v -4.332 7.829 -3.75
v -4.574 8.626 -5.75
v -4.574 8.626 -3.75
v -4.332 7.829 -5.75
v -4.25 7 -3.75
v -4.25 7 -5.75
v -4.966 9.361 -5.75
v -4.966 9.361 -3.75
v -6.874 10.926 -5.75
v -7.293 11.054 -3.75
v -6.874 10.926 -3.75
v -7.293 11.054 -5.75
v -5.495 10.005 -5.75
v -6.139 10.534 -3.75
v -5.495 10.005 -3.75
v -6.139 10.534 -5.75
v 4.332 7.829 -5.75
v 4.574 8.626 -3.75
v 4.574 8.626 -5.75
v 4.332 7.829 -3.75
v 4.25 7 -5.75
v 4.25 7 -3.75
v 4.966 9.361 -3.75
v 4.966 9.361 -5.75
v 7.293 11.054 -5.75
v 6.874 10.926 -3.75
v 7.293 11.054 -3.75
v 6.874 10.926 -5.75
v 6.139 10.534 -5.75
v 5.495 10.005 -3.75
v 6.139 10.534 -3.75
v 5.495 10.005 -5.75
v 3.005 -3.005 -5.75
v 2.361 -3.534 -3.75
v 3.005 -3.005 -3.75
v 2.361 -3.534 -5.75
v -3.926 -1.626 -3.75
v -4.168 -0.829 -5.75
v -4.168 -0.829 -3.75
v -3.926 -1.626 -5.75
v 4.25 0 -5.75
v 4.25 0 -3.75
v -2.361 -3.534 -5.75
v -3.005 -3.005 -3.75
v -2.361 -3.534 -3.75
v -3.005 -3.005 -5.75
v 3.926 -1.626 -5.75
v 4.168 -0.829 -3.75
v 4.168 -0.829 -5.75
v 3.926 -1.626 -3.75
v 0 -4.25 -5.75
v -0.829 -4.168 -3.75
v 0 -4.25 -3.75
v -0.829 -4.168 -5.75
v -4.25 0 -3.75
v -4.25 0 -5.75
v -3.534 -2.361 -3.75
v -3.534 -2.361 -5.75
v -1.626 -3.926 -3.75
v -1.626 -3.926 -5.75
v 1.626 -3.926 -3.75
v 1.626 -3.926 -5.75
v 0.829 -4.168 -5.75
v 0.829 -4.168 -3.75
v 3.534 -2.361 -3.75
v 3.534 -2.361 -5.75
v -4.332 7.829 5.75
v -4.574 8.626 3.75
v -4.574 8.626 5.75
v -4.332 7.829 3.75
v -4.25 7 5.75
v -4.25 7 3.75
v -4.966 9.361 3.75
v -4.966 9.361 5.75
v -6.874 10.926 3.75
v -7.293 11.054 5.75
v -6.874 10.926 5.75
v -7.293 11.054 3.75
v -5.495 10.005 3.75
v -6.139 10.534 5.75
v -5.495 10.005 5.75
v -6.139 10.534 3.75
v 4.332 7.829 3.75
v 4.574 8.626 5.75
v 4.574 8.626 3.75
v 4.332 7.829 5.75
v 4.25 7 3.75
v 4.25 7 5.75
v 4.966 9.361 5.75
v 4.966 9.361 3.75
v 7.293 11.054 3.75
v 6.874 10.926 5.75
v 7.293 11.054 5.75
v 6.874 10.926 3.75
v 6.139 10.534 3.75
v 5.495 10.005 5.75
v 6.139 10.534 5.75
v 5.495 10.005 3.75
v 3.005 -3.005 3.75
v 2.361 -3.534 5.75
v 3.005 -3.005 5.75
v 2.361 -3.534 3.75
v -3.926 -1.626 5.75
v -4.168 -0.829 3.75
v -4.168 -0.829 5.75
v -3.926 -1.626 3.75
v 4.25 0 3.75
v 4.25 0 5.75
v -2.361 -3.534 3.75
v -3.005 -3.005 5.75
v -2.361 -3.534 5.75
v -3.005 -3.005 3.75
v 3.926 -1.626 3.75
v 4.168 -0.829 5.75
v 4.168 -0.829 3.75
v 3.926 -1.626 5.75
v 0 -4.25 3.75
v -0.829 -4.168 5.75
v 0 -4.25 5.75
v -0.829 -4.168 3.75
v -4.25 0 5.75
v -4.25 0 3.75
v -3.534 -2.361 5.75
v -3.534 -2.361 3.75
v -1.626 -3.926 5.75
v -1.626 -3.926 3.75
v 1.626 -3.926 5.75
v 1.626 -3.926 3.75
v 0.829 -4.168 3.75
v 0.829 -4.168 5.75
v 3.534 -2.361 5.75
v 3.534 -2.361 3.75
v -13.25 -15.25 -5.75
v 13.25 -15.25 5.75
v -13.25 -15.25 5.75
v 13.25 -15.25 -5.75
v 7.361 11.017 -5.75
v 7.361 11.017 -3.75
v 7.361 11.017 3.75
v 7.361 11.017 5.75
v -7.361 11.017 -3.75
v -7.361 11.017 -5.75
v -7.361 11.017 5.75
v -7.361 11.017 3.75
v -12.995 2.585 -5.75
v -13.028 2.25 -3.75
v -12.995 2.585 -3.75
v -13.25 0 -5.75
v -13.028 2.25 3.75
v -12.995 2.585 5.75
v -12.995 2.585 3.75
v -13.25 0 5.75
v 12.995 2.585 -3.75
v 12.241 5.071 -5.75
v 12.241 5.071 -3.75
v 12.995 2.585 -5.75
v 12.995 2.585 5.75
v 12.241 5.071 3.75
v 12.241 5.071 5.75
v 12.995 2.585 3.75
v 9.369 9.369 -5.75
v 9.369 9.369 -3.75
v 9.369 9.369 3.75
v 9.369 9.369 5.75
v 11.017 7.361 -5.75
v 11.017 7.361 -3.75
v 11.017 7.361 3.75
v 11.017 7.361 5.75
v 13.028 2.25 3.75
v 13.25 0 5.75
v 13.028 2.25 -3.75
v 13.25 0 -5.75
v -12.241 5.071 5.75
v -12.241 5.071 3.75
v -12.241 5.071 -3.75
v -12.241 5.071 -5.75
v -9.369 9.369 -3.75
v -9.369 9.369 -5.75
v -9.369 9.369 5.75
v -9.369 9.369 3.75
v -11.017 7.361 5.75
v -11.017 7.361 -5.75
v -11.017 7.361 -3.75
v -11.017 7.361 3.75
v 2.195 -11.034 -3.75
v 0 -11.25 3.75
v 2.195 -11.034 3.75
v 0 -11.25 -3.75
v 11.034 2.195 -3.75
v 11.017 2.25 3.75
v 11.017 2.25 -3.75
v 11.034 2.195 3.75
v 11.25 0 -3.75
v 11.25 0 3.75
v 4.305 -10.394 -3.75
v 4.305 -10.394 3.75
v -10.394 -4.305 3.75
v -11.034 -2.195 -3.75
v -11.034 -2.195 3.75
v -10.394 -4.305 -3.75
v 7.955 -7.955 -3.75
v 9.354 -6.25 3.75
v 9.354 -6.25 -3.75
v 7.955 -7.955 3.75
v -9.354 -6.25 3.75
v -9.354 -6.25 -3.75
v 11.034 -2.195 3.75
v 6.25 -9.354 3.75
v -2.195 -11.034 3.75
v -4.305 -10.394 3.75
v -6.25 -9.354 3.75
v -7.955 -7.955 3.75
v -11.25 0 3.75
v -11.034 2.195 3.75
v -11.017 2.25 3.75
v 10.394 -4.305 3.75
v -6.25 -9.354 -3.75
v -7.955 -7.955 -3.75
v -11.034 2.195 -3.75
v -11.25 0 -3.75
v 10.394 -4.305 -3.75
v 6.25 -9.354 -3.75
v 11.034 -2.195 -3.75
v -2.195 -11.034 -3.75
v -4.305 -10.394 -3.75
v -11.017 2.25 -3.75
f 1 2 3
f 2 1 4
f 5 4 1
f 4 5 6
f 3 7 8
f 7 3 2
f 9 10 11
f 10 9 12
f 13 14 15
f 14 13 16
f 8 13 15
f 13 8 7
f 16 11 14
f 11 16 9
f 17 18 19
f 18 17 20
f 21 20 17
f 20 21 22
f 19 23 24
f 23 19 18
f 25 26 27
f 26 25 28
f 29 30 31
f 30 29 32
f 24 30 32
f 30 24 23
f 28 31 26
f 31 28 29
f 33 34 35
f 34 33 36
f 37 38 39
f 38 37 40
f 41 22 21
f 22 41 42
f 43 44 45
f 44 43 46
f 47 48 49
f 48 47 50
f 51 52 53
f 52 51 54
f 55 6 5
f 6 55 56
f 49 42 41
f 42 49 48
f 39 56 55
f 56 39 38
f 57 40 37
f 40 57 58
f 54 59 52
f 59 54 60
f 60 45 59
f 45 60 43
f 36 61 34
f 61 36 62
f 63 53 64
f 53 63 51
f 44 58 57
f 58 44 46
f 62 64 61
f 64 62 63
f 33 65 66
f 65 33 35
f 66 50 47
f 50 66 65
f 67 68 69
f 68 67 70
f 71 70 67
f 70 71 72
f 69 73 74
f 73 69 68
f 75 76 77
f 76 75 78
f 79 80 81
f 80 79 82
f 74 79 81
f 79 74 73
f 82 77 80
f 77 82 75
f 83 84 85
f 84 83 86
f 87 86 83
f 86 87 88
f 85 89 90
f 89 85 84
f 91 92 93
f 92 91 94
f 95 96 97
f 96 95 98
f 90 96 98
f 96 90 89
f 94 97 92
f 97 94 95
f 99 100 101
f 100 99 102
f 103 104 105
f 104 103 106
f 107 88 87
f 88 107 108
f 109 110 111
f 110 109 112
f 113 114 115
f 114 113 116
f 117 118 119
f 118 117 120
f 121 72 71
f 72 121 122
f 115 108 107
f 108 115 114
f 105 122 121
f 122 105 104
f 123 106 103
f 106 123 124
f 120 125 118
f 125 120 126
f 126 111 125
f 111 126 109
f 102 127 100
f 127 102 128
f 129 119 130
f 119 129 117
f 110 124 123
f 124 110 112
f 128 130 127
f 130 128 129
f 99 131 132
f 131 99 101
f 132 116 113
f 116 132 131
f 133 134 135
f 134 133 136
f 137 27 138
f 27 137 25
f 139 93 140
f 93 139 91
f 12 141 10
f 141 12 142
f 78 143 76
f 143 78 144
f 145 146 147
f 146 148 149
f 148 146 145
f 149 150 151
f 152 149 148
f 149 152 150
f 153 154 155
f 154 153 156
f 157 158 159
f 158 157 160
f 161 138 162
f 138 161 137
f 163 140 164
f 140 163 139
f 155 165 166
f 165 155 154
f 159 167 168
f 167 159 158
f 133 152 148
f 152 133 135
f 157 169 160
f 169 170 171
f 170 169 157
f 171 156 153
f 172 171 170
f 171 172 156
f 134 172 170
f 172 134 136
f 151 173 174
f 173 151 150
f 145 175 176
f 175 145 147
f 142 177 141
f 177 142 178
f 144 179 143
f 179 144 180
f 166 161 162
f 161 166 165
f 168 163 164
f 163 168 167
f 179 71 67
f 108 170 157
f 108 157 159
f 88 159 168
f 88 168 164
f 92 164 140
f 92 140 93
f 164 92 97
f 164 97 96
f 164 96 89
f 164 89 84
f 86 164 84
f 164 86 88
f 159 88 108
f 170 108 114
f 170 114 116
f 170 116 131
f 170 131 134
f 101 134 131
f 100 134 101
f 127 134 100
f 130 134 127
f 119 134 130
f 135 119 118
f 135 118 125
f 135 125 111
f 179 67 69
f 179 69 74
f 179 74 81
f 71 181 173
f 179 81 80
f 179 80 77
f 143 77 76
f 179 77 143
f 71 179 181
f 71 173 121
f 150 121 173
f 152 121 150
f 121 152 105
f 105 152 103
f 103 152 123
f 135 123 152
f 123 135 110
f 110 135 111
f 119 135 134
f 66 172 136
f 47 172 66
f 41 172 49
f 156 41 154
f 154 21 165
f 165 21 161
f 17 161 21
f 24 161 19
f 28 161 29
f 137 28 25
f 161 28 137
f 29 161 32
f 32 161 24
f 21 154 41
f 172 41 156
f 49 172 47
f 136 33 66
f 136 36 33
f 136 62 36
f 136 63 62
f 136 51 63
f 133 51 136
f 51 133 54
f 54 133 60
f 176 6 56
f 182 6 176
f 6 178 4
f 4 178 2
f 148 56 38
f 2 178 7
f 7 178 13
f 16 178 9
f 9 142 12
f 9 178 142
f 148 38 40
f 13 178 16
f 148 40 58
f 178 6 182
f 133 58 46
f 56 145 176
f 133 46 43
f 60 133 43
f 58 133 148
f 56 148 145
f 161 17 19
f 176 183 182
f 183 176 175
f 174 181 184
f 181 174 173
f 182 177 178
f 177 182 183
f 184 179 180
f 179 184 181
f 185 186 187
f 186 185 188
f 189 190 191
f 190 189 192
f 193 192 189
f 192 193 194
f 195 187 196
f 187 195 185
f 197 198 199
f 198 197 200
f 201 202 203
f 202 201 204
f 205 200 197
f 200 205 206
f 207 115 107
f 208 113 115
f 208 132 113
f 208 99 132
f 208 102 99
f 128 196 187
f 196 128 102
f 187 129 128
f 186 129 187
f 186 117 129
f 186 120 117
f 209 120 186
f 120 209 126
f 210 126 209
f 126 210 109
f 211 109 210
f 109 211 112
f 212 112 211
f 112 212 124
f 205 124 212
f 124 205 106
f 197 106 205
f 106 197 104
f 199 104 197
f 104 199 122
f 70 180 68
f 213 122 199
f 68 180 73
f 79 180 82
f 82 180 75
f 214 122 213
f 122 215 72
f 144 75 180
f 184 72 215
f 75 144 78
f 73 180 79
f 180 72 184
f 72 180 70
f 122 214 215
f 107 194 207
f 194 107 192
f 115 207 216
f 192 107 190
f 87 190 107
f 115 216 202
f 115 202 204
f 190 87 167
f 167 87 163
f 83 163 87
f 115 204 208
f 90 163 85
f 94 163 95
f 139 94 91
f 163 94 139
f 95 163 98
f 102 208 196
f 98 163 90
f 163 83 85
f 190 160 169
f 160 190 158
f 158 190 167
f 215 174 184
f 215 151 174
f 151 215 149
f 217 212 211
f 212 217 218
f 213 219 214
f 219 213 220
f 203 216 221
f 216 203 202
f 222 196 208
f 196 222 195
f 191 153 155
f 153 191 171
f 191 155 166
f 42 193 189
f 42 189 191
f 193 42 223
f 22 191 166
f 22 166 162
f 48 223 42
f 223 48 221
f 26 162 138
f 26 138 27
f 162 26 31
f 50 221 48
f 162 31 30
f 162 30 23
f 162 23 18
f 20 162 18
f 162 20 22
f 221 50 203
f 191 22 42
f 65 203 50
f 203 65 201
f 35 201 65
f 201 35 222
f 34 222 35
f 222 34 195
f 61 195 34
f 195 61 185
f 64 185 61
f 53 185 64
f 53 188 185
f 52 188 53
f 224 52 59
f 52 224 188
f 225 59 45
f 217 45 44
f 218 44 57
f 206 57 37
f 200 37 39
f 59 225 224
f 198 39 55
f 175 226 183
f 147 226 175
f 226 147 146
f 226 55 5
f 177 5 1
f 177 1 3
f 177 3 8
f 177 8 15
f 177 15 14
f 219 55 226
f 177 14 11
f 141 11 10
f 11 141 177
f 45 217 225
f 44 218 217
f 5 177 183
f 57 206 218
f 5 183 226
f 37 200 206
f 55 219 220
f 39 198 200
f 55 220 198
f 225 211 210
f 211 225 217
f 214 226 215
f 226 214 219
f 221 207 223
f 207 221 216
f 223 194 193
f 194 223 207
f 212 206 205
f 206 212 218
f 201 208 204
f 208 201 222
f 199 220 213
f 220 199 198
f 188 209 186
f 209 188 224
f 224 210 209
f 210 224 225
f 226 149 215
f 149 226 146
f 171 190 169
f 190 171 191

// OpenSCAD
$fn = 32;

cutting_epsilon = 0.01;

module cutout_rounding_cutter(rounding = 5, height = 10) {
	difference() {
		// take a cylinder out of a cube to get a cutter that can cut
		// bevels
		cube([rounding, rounding, height], center = true);
		translate([-rounding/2, -rounding/2, 0])
			cylinder(d = rounding, h = height + 2*cutting_epsilon, center = true);
	}
}

module shaft_cutout_cutter(width, diameter, slot_height = 0,
		rounding = 0, rounding_height = 0) {
	// cutout for shaft
	hull() {
		cylinder(h = width, d = diameter, center = true);
		if (slot_height > 0) {
			translate([0, slot_height, 0])
				cube([diameter, 1, width], center = true);
		}
	}

	// round the cutout for the shaft
	if (slot_height > 0 && rounding > 0) {
		rounding_height = rounding_height == -1 ? slot_height : rounding_height;
		translate([0, rounding_height, 0]) {
			translate([-rounding/2, 0, 0])
				cutout_rounding_cutter(rounding, width);
			translate([rounding/2, 0, 0])
				mirror([1, 0, 0])
					cutout_rounding_cutter(rounding, width);
		}
	}
}

module bearing_holder(outer_diameter = 22, width = 7, thickness = 2,
		clip_cutting_factor = 0.1, shaft_diameter = 8,
		bottom_shaft_hole = true, top_shaft_hole = true,
		bottom_shaft_slot = true, top_shaft_slot = true,
		shaft_slots_rounded = true,
		epsilon = 0.25) {
	cw = width + 2*epsilon;
	cod = outer_diameter + 2*epsilon;
	csd = shaft_diameter + 2*epsilon;

	diameter_overall = cod + 2*thickness;
	width_overall = cw + 2*thickness;
	clip_cutting_pos = cod * clip_cutting_factor;
	difference() {
		// flow holder and socket into each other
		hull() {
			// outer casing for holding the bearing
			cylinder(h = width_overall, d = diameter_overall, center = true);

			// socket that is one thickness thick and overall
			// diameter and it's own thickness below the holder
			translate([0, -diameter_overall/2 - thickness/2, 0])
				cube([diameter_overall, thickness, width_overall], center = true);
		}

		// cutout the size of the actual bearing
		#cylinder(h = cw, d = cod, center = true);

		// cutout so that bearing can be clipped into holder
		clip_cutter_height = diameter_overall / 2;
		translate([0, clip_cutter_height / 2 + clip_cutting_pos, 0])
			cube([diameter_overall, clip_cutter_height, cw],
				center = true);

		shaft_slot_height = diameter_overall/2;
		shaft_slot_rounding = shaft_slots_rounded ? csd : 0;
		shaft_slot_rounding_height = cod/2;
		if (bottom_shaft_hole) {
			bottom_shaft_slot_height = bottom_shaft_slot ? shaft_slot_height : 0;
			translate([0, 0, -width_overall/2 + thickness/2])
				shaft_cutout_cutter(width = thickness + 2*cutting_epsilon,
					diameter = csd,
					slot_height = bottom_shaft_slot_height,
					rounding = shaft_slot_rounding,
					rounding_height = shaft_slot_rounding_height);
		}

		if (top_shaft_hole) {
			top_shaft_slot_height = top_shaft_slot ? shaft_slot_height : 0;
			translate([0, 0, width_overall/2 - thickness/2])
				shaft_cutout_cutter(width = thickness + 2*cutting_epsilon,
					diameter = csd,
					rounding = shaft_slot_rounding,
					slot_height = top_shaft_slot_height,
					rounding = shaft_slot_rounding,
					rounding_height = shaft_slot_rounding_height);
		}
	}
}

bearing_holder();
